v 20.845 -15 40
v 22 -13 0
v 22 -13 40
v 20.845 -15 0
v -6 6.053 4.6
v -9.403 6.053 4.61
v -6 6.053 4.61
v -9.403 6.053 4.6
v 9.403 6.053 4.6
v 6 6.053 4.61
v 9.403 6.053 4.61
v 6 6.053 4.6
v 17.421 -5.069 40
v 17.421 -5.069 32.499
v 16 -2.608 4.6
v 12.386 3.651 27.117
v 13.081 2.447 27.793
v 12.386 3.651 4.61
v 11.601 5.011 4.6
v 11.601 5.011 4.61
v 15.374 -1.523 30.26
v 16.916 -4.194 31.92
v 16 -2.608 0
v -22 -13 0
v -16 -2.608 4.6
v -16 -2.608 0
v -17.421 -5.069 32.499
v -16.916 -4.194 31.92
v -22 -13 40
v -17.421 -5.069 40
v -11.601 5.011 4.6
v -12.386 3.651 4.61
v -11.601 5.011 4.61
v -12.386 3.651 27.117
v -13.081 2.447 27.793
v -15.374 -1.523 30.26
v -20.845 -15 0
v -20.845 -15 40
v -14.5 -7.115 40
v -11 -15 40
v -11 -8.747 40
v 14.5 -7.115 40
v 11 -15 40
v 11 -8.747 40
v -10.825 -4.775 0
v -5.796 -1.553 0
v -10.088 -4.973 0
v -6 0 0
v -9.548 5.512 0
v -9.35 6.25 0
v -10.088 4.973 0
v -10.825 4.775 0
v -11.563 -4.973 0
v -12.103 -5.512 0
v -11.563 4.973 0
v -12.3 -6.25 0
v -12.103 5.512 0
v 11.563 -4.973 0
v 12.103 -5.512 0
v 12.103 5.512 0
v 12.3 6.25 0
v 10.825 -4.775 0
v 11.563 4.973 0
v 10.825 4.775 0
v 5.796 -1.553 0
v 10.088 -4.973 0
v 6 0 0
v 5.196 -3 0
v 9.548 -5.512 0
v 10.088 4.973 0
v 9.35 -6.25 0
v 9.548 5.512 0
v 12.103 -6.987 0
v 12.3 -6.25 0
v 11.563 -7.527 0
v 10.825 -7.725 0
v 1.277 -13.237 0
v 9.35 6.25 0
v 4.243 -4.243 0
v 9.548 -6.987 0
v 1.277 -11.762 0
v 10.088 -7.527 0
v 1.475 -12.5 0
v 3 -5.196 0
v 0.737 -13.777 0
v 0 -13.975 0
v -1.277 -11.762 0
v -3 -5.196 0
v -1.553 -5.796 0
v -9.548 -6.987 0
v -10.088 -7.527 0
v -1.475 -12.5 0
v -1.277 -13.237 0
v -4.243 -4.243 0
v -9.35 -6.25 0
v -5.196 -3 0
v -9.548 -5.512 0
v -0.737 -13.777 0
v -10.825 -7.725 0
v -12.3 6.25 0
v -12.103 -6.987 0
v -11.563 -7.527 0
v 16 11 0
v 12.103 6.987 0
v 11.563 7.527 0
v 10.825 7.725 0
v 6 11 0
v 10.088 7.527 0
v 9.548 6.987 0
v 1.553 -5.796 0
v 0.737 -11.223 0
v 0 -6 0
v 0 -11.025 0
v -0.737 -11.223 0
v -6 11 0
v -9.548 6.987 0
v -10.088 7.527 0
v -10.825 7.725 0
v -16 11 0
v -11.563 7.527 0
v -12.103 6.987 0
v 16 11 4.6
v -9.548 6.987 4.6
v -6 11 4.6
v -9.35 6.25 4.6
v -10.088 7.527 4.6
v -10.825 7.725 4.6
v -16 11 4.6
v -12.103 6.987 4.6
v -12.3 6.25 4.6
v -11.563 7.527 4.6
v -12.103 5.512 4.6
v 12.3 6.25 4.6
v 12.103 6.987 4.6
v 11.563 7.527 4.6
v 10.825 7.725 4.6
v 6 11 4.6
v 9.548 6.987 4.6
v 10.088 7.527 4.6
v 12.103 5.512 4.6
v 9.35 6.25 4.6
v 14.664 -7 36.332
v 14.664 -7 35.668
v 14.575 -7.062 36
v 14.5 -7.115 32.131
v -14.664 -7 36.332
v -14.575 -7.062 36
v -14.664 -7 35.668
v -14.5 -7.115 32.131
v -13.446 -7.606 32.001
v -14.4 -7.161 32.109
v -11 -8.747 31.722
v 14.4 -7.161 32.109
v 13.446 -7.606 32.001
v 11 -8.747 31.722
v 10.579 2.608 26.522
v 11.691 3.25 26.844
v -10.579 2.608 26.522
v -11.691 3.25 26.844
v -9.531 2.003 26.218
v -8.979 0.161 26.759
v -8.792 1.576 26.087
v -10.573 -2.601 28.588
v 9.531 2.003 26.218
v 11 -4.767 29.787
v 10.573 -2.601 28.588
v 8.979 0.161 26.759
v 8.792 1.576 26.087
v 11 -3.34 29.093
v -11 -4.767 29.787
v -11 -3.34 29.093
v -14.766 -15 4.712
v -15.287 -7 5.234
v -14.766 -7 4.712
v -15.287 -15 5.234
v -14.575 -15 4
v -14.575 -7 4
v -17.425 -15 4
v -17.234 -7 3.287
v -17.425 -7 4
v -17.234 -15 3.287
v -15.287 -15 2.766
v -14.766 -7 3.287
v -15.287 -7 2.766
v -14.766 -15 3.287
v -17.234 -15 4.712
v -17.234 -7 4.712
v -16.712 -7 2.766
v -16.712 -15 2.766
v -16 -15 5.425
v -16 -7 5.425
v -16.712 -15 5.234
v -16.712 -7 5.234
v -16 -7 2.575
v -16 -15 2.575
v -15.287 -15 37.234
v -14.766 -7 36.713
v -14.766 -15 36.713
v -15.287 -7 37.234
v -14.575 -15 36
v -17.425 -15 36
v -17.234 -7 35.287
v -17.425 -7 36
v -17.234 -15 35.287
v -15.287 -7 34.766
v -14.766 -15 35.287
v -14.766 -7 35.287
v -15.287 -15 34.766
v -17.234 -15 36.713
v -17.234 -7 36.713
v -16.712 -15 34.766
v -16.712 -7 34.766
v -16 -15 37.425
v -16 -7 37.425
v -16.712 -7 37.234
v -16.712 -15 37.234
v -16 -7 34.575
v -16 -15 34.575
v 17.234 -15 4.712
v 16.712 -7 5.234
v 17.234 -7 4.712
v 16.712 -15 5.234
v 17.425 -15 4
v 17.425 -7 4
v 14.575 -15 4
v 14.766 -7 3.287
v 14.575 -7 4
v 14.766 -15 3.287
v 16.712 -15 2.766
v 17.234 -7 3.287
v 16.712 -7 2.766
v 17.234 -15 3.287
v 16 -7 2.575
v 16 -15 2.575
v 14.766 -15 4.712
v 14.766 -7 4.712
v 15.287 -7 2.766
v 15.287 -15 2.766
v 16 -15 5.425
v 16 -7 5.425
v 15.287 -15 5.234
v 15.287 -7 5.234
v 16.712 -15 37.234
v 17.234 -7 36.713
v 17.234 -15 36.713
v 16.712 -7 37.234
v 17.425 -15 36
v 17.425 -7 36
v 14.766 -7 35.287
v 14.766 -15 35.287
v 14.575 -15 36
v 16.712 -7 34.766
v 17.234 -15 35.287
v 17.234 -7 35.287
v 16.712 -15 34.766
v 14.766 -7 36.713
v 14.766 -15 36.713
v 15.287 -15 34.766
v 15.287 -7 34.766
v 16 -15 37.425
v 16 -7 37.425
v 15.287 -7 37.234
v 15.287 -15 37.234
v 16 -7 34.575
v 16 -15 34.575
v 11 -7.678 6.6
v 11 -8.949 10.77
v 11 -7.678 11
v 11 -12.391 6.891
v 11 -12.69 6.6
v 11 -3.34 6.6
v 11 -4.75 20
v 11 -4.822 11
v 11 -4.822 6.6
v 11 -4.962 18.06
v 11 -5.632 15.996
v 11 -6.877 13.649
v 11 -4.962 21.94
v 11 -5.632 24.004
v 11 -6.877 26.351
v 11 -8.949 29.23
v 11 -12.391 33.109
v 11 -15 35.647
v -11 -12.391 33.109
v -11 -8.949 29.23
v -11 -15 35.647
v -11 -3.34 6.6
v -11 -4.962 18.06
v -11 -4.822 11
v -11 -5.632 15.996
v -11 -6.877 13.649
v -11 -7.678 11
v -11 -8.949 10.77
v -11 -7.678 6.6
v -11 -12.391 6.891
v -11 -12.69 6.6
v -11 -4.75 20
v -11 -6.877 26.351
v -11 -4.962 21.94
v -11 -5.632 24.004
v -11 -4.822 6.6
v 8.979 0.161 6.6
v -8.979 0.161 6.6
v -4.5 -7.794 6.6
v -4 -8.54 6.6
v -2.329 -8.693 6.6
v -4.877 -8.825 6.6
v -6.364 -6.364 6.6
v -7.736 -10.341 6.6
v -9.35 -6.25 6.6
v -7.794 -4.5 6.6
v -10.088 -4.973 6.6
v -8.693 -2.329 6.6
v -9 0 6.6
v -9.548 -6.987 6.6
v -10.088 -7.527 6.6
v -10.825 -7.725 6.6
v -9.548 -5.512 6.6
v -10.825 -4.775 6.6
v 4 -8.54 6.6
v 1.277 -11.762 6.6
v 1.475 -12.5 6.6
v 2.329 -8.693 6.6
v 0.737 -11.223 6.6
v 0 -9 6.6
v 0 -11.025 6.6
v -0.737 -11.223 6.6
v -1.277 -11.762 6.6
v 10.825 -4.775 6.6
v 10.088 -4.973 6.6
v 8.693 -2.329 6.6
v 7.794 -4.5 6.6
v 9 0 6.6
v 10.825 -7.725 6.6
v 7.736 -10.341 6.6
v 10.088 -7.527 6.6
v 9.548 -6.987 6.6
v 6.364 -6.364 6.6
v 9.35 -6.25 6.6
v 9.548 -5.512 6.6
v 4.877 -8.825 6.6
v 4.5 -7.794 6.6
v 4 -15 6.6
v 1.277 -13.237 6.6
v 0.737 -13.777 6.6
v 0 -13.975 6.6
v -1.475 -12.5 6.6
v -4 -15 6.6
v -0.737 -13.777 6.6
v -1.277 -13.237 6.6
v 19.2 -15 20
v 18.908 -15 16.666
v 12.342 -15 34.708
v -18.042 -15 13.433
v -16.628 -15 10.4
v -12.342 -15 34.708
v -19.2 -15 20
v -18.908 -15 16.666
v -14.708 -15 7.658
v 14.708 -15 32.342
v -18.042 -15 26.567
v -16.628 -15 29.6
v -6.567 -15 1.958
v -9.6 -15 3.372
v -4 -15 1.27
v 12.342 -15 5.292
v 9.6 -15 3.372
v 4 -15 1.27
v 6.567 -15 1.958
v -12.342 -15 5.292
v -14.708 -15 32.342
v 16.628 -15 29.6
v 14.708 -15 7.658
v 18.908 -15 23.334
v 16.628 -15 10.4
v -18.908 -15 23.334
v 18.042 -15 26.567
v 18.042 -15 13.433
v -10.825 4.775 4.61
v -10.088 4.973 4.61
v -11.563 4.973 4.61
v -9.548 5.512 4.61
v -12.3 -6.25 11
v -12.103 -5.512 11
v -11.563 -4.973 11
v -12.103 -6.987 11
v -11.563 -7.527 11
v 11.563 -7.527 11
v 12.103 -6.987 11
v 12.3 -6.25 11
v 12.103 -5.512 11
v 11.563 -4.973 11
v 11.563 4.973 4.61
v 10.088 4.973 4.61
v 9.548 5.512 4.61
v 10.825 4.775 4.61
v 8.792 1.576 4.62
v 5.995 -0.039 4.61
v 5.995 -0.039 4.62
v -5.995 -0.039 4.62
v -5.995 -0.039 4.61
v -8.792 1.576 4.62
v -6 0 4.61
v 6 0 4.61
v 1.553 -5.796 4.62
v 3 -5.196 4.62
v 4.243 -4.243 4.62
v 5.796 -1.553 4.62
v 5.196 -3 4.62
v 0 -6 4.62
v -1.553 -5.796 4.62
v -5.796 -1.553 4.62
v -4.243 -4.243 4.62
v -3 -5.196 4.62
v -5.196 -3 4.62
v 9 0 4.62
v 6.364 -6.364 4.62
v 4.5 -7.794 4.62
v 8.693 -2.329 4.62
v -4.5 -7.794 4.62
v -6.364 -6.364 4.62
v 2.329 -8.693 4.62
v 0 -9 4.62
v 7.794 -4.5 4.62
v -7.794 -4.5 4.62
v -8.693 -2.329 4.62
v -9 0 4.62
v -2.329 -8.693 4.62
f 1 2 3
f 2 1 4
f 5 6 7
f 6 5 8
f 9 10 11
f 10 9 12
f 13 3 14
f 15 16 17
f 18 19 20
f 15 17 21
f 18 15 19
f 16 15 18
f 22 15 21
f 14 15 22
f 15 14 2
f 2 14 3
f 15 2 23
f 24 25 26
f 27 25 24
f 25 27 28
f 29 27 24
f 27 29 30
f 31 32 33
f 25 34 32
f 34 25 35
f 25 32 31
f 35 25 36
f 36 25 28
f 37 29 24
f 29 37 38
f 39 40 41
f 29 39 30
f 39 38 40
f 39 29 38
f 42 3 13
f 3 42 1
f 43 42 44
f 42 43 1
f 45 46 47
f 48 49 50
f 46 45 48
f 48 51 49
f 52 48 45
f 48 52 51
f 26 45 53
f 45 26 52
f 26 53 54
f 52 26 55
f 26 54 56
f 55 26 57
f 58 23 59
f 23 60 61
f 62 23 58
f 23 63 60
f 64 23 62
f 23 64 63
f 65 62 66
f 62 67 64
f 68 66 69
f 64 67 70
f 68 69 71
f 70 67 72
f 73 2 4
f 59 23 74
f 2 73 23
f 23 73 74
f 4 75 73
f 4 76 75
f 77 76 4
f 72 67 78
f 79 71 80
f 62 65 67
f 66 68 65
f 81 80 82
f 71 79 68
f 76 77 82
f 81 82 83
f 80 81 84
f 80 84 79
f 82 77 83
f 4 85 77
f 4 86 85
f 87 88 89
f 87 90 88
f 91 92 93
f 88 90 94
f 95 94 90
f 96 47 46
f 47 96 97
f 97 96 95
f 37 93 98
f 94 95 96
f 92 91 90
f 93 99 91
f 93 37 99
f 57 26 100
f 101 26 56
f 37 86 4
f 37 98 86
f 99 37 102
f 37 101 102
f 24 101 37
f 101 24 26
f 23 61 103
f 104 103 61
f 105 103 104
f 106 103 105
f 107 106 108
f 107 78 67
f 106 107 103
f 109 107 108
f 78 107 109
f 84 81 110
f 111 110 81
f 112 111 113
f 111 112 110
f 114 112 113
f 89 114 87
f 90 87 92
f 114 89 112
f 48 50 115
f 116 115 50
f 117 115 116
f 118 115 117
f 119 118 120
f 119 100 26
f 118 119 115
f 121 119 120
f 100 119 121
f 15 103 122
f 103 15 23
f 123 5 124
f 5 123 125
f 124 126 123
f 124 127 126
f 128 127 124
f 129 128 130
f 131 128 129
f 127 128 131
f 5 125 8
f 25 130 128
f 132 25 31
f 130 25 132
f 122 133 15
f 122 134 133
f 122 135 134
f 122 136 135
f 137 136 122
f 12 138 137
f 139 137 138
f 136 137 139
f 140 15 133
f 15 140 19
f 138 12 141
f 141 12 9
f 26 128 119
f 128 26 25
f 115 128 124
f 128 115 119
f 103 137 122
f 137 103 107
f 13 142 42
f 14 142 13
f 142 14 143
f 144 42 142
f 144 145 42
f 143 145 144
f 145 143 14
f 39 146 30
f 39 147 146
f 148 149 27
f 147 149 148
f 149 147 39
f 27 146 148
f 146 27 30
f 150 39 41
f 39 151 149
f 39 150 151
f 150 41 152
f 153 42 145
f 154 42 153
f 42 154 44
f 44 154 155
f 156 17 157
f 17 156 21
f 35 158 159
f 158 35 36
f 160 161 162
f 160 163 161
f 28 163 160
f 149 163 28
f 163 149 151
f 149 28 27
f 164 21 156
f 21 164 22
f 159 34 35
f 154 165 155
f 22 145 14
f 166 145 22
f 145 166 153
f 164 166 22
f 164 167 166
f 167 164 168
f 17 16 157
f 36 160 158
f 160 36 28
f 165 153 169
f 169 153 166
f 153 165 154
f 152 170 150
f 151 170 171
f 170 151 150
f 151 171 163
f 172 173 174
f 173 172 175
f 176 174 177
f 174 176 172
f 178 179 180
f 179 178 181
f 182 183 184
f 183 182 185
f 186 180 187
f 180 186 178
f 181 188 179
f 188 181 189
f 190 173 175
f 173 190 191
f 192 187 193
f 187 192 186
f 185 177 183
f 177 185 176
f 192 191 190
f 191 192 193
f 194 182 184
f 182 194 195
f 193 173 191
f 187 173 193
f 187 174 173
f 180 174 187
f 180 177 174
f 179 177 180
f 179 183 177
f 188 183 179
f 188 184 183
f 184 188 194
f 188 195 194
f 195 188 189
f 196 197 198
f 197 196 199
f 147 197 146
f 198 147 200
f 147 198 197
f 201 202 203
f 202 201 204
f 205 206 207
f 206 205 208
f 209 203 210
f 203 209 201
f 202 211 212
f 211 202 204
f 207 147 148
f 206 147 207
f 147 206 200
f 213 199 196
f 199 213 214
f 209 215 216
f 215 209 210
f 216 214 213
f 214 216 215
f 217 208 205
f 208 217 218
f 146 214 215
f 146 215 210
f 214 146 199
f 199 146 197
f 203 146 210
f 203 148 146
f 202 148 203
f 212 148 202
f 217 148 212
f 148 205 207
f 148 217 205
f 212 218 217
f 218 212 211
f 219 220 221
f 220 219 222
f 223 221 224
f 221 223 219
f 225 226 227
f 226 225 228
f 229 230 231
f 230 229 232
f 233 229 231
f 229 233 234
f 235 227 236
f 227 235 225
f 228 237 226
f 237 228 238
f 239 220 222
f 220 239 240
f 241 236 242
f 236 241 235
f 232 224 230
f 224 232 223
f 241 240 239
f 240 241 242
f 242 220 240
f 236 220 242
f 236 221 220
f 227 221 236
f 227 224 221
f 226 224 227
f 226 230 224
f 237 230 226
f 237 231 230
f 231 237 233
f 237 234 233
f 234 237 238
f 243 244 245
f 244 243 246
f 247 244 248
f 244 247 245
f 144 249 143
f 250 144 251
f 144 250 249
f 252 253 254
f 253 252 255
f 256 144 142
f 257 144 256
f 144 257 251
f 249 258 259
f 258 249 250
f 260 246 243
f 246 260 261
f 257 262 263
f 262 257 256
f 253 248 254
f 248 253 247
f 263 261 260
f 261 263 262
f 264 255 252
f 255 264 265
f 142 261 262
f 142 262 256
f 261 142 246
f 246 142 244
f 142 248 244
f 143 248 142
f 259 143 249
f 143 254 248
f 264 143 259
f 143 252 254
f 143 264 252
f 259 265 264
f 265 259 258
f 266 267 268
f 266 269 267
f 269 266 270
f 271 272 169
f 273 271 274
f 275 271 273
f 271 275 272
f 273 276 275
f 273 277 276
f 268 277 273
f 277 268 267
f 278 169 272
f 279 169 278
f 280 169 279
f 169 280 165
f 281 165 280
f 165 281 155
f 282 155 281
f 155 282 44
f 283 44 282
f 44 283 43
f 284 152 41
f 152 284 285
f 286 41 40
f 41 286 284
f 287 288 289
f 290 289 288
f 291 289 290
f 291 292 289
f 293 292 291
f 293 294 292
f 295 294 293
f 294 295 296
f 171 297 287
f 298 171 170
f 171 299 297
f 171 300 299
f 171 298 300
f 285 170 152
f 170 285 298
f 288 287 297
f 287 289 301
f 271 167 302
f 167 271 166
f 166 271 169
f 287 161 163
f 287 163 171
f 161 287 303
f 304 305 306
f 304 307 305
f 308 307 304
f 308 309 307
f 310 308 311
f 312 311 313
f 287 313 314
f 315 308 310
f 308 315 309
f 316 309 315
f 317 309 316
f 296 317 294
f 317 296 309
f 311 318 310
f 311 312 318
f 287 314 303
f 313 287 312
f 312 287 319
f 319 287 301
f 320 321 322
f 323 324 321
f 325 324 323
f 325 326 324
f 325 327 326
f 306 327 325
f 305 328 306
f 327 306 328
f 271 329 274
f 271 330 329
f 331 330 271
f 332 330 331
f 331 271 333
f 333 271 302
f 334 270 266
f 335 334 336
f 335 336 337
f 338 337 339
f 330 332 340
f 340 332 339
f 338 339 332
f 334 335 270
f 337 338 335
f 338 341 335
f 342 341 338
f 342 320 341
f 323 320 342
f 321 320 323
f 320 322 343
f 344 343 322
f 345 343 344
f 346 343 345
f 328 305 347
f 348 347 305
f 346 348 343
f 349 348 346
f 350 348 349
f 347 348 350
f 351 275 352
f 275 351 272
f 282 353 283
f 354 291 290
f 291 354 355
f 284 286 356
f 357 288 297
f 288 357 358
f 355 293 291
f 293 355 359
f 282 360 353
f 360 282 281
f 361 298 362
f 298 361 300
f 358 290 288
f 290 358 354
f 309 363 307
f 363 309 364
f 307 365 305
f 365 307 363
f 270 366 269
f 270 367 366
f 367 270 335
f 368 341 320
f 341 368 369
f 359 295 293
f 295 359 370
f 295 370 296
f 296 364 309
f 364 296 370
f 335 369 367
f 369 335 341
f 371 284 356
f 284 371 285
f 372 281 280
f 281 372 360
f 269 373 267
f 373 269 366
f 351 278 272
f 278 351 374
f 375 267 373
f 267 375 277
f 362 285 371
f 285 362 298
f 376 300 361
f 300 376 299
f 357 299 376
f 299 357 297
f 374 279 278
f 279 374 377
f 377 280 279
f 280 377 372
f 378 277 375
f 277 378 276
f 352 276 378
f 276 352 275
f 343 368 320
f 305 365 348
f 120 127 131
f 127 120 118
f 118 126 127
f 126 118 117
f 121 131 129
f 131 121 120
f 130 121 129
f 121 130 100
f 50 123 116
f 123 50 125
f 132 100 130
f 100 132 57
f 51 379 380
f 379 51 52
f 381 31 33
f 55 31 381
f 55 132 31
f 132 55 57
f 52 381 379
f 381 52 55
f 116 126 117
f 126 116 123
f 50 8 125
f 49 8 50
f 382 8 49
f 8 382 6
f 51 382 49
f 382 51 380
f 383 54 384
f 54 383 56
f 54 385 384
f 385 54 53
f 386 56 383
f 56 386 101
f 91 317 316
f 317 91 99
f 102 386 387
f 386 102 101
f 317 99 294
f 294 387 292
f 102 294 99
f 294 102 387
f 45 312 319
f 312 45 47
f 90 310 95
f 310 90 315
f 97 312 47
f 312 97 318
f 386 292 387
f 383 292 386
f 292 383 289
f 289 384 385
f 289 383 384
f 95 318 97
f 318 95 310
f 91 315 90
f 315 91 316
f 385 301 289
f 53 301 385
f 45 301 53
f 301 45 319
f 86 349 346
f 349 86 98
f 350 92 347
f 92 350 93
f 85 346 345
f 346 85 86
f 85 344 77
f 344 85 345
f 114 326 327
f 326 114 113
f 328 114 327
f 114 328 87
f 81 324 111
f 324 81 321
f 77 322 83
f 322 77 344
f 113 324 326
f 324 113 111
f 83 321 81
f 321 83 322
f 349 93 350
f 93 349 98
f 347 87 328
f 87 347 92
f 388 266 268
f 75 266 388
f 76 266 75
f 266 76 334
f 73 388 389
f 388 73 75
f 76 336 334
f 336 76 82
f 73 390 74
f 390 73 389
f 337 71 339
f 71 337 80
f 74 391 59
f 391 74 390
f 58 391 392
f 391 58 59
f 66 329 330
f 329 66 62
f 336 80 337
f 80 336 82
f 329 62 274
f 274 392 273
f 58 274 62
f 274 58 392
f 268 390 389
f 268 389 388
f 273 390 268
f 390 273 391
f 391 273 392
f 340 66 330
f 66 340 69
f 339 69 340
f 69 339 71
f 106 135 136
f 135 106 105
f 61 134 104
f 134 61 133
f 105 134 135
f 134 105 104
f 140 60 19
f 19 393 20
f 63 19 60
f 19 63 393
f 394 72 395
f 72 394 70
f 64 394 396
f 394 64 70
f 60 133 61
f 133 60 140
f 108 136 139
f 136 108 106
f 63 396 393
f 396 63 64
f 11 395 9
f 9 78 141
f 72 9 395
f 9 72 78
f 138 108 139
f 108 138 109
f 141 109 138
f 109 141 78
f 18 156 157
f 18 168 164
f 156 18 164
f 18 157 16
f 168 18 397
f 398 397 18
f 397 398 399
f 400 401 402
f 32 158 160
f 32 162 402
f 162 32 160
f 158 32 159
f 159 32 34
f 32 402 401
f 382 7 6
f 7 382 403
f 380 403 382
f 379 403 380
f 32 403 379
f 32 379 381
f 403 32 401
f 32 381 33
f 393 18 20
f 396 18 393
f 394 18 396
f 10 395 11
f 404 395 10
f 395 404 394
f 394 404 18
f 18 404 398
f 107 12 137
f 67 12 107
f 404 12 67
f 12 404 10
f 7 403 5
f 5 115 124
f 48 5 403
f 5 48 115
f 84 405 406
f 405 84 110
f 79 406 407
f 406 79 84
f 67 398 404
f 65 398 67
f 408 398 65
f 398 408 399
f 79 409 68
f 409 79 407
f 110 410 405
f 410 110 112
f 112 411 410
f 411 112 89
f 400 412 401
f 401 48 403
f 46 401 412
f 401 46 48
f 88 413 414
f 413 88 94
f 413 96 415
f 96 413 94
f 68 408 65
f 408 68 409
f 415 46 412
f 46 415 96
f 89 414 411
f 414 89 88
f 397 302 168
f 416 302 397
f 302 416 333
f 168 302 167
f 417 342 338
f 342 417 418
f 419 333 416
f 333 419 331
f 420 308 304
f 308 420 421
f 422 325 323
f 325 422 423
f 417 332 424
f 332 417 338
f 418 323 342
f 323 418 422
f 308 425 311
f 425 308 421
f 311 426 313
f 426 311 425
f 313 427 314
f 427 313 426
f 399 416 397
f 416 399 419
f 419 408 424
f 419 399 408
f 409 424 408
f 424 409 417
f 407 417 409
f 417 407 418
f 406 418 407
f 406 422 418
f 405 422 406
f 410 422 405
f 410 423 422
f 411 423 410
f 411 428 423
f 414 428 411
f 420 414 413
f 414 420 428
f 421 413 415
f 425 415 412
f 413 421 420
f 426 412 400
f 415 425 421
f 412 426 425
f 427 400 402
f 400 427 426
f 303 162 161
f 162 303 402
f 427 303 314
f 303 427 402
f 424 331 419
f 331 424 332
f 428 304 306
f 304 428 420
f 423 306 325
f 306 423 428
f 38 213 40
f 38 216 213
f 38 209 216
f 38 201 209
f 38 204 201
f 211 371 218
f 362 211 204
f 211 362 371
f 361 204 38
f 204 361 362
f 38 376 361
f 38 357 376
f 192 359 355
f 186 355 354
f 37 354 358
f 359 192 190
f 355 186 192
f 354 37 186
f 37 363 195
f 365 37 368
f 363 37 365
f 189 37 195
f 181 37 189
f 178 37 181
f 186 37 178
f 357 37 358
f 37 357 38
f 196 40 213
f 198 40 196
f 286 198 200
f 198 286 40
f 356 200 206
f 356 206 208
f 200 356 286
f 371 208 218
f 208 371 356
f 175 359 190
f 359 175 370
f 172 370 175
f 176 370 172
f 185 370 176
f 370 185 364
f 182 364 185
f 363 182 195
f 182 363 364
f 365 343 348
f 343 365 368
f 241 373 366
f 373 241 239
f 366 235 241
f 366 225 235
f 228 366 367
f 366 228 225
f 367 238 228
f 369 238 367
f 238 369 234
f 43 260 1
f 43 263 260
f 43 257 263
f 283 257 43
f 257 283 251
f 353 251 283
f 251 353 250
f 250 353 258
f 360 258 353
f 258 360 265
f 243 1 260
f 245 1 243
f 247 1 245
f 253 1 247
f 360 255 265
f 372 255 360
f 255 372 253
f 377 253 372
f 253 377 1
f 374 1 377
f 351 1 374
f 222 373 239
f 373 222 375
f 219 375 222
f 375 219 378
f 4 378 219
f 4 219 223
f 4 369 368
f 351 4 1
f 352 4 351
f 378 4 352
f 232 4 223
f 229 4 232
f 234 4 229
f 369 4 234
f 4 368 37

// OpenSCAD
// file: configuration.scad
// Increase this if your slicer or printer make holes too tight.
extra_radius = 0.1;

// OD = outside diameter, corner to corner.
m3_nut_od = 6.1;
m3_nut_radius = m3_nut_od/2 + 0.2 + extra_radius;
m3_washer_radius = 3.5 + extra_radius;

// Major diameter of metric 3mm thread.
m3_major = 2.85;
m3_radius = m3_major/2 + extra_radius;
m3_wide_radius = m3_major/2 + extra_radius + 0.2;

// NEMA17 stepper motors.
motor_shaft_diameter = 5;
motor_shaft_radius = motor_shaft_diameter/2 + extra_radius;

// Frame brackets. M3x8mm screws work best with 3.6 mm brackets.
thickness = 3.6;

// OpenBeam or Misumi. Currently only 15x15 mm, but there is a plan
// to make models more parametric and allow 20x20 mm in the future.
extrusion = 15;

// Placement for the NEMA17 stepper motors.
motor_offset = 44;
motor_length = 47;
// main file
include <configuration.scad>;

barrel_radius = 8;
barrel_height = 30;

groove_radius = 6;
groove_height = 4.6;

fan_offset = 15;

module hotend_fan() {
  difference() {
    union() {
      translate([0, 2 - fan_offset, 0])
        cylinder(r=22, h=40, $fn=6);
      translate([0, 0, groove_height/2])
        cube([32, 22, groove_height], center=true);
    }
    // Opposite side cutaway (outgoing airflow).
    translate([0, 38, groove_height + 0.01]) rotate([0, 0, 30])
      cylinder(r=41.5, h=200, $fn=6);
    // Groove mount insert slot.
    translate([0, 10, 0])
      cube([2*groove_radius, 20, 20], center=true);
    // Keep printed plastic away from the hotend.
    intersection() {
      translate([0, 18, 0]) rotate([0, 0, 30])
        cylinder(r=29, h=100, center=true, $fn=36);
      translate([0, 10, barrel_height-7])
        cylinder(r1=barrel_radius-1, r2=100, h=55, $fn=36);
    }
    // Groove mount.
    cylinder(r=groove_radius, h=200, center=true, $fn=24);
    // J-Head barrel.
    translate([0, 0, groove_height + 0.02])
      cylinder(r=barrel_radius + 1, h=100, $fn=24);
    // Fan mounting surface and screws.
    translate([0, -50 - fan_offset, 0])
      cube([100, 100, 100], center=true);
    for (x = [-16, 16]) {
      for (z = [-16, 16]) {
        translate([x, -fan_offset, z+20]) rotate([90, 0, 0]) 
          cylinder(r=m3_radius-0.1, h=16, center=true, $fn=12);
      }
    }
    // Vertical inner space.
    intersection() {
      cube([22, 100, 100], center=true);
      translate([0, -12, groove_height + 2])
        cylinder(r=16, h=40, $fn=6);
    }
    // Air funnel.
    difference() {
      translate([0, -1 - fan_offset, 20]) rotate([-90, 0, 0])
        cylinder(r1=20, r2=0, h=25, $fn=36);
      cube([8, 40, 40], center=true);
    }
    for (a = [60:60:359]) {
      rotate([0, 0, a]) translate([0, 12.5, 5]) #
        cylinder(r=m3_radius-0.05, h=12, center=true, $fn=12);
    }
  }
}

hotend_fan();

// Hotend barrel.
translate([0, 0, groove_height]) %
  cylinder(r=barrel_radius, h=barrel_height);

// 40mm fan.
translate([0, -5 - fan_offset, 20]) % difference() {
  cube([40, 10, 40], center=true);
  rotate([90, 0, 0,]) cylinder(r=19, h=20, center=true);
}
